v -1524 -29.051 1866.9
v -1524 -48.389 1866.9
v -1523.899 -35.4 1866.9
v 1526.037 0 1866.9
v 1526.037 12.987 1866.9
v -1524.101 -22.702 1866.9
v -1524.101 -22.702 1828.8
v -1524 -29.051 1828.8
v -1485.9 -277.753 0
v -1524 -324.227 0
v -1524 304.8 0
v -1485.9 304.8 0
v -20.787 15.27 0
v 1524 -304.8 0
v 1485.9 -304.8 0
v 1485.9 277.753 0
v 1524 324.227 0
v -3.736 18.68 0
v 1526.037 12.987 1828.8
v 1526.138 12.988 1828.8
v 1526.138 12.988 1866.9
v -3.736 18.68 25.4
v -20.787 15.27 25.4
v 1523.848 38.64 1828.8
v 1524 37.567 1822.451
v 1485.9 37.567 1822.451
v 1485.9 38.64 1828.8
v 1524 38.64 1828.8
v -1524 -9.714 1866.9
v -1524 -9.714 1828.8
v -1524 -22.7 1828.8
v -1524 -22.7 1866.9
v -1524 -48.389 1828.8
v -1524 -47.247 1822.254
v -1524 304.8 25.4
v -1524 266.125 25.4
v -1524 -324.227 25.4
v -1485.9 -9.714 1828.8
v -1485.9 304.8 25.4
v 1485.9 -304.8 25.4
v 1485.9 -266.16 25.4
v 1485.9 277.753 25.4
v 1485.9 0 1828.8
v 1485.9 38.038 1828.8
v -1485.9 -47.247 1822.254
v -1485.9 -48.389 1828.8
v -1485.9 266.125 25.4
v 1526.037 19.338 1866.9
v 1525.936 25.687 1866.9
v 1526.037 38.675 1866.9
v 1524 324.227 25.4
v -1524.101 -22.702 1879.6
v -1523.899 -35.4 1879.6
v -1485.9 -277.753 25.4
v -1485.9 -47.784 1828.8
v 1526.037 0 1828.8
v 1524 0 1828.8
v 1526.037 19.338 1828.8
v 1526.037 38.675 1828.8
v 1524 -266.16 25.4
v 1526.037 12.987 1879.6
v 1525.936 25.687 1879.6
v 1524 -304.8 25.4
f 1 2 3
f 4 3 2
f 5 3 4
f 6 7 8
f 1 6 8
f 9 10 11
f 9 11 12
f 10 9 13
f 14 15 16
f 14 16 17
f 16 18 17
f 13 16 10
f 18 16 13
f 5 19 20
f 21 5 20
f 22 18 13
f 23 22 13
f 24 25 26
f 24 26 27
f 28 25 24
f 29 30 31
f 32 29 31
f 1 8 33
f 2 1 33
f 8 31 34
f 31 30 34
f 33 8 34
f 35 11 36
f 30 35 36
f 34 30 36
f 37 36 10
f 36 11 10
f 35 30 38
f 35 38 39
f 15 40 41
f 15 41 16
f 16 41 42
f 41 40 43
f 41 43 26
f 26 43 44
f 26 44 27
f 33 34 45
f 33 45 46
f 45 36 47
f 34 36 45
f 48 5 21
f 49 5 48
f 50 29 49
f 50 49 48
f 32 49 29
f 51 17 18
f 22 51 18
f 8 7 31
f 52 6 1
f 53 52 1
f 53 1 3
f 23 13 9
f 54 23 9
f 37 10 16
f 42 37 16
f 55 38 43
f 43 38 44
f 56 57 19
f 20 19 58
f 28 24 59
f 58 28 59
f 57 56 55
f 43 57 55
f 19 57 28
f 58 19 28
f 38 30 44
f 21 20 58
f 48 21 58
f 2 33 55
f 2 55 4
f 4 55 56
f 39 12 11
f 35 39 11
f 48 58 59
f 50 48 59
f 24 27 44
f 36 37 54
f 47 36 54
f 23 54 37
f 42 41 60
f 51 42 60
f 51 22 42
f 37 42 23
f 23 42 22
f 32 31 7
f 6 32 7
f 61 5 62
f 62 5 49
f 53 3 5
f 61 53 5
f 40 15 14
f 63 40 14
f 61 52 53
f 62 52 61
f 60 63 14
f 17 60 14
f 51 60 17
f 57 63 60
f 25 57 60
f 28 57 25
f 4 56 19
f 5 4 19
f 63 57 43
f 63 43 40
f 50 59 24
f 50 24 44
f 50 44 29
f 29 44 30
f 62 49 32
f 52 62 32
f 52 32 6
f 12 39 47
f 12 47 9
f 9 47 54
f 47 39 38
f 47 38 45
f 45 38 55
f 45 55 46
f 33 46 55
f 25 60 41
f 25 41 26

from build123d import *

# Parameters (mm, degrees)
F1_DEPTH = 25.4
F3_DEPTH = 38.1
F5_DEPTH = 38.1
F7_DEPTH = 38.1
F9_DEPTH = 12.7


# Not quite as in the source:
# - ends of sketch curves that miss each other by under 0.0002 mm in the source are joined


with BuildPart() as f1:
    # F0 (on Top) → F1 (new body)
    with BuildSketch(Plane.XY):
        Polygon((1524, -304.8), (1524, 324.2272643468), (-3.7360123744, 18.6800618719), (-3.0765473876, 15.3827369381), (179.8806457879, 16.5488648108), (1485.9, 277.7527356532), (1485.9, -9.5795955801), (1485.9, -304.8), align=None)
        Polygon((-1485.941186152, 124.6566928906), (-1485.9, 124.6078212585), (-1485.9, 183.7307214737), align=None)
        Polygon((179.8806457879, 16.5488648108), (-3.0765473876, 15.3827369381), (-20.7870508093, 15.2698541849), (-198.7212794918, -20.3169915516), (1.9464171055, -19.0379809257), align=None)
        Polygon((-3.0765473876, 15.3827369381), (-3.7360123744, 18.6800618719), (-20.7870508093, 15.2698541849), align=None)
        Polygon((1.9464171055, -19.0379809257), (-198.7212794918, -20.3169915516), (-1485.9, -277.7527356532), (-1485.9, 124.6078212585), (-1485.941186152, 124.6566928906), (-1485.9, 183.7307214737), (-1485.9, 304.8), (-1524, 304.8), (-1524, -324.2272643468), align=None)
    extrude(amount=F1_DEPTH)

    # F2 (on face) → F3 (join)
    with BuildSketch(Plane.YZ.offset(1524)):
        Polygon((-266.1596539356, 25.4), (0, 1600.1779524521), (0, 1828.8), (-304.8, 25.4), align=None)
        Polygon((0, 1828.8), (0, 1600.1779524521), (37.5672101274, 1822.4506123728), align=None)
        Polygon((38.6403460644, 1828.8), (0, 1828.8), (37.5672101274, 1822.4506123728), align=None)
    extrude(amount=-F3_DEPTH)

    # F4 (on face) → F5 (join)
    with BuildSketch(Plane(origin=(-1524, 0, 0), x_dir=(0, -1, 0), z_dir=(-1, 0, 0))):
        Polygon((9.7136321734, 1828.8), (9.7136321734, 1607.03972256), (47.2471081512, 1822.2541477998), align=None)
        Polygon((48.3887072147, 1828.8), (9.7136321734, 1828.8), (47.2471081512, 1822.2541477998), align=None)
        Polygon((-266.1249249587, 25.4), (9.7136321734, 1607.03972256), (9.7136321734, 1828.8), (-304.8, 25.4), align=None)
    extrude(amount=-F5_DEPTH)

    # F6 (on face) → F7 (join)
    with BuildSketch(Plane.XY.offset(1828.8)):
        Polygon((-1524, -29.0511696941), (-1524, -48.3887072147), (1526.0369777679, 0), (1526.0369777679, 12.9867385989), (-1523.899270198, -35.4003705418), align=None)
        Polygon((-1524.1007298046, -22.7019686808), (-1524, -29.0511696941), (-1524, -22.7003706067), align=None)
        Polygon((-1524, -22.7003706067), (-1524, -29.0511696941), (-1523.899270198, -35.4003705418), (1526.0369777679, 12.9867385989), (1526.0369777679, 19.3375375207), (1525.9362479633, 25.6867385339), align=None)
        Polygon((1526.0369777679, 19.3375375207), (1526.0369777679, 12.9867385989), (1526.1377075699, 12.9883366729), align=None)
        Polygon((-1524, -9.7136321734), (-1524, -22.7003706067), (1525.9362479633, 25.6867385339), (1526.0369777679, 19.3375375207), (1526.0369777679, 38.6750750413), align=None)
    extrude(amount=F7_DEPTH)

    # F8 (on face) → F9 (join)
    with BuildSketch(Plane.XY.offset(1866.9)):
        Polygon((1526.0369777679, 12.9867385989), (1525.9362479641, 25.6867384858), (-1524.1007298039, -22.701968729), (-1523.8992701954, -35.4003707073), align=None)
    extrude(amount=F9_DEPTH)


solid = f1.part
